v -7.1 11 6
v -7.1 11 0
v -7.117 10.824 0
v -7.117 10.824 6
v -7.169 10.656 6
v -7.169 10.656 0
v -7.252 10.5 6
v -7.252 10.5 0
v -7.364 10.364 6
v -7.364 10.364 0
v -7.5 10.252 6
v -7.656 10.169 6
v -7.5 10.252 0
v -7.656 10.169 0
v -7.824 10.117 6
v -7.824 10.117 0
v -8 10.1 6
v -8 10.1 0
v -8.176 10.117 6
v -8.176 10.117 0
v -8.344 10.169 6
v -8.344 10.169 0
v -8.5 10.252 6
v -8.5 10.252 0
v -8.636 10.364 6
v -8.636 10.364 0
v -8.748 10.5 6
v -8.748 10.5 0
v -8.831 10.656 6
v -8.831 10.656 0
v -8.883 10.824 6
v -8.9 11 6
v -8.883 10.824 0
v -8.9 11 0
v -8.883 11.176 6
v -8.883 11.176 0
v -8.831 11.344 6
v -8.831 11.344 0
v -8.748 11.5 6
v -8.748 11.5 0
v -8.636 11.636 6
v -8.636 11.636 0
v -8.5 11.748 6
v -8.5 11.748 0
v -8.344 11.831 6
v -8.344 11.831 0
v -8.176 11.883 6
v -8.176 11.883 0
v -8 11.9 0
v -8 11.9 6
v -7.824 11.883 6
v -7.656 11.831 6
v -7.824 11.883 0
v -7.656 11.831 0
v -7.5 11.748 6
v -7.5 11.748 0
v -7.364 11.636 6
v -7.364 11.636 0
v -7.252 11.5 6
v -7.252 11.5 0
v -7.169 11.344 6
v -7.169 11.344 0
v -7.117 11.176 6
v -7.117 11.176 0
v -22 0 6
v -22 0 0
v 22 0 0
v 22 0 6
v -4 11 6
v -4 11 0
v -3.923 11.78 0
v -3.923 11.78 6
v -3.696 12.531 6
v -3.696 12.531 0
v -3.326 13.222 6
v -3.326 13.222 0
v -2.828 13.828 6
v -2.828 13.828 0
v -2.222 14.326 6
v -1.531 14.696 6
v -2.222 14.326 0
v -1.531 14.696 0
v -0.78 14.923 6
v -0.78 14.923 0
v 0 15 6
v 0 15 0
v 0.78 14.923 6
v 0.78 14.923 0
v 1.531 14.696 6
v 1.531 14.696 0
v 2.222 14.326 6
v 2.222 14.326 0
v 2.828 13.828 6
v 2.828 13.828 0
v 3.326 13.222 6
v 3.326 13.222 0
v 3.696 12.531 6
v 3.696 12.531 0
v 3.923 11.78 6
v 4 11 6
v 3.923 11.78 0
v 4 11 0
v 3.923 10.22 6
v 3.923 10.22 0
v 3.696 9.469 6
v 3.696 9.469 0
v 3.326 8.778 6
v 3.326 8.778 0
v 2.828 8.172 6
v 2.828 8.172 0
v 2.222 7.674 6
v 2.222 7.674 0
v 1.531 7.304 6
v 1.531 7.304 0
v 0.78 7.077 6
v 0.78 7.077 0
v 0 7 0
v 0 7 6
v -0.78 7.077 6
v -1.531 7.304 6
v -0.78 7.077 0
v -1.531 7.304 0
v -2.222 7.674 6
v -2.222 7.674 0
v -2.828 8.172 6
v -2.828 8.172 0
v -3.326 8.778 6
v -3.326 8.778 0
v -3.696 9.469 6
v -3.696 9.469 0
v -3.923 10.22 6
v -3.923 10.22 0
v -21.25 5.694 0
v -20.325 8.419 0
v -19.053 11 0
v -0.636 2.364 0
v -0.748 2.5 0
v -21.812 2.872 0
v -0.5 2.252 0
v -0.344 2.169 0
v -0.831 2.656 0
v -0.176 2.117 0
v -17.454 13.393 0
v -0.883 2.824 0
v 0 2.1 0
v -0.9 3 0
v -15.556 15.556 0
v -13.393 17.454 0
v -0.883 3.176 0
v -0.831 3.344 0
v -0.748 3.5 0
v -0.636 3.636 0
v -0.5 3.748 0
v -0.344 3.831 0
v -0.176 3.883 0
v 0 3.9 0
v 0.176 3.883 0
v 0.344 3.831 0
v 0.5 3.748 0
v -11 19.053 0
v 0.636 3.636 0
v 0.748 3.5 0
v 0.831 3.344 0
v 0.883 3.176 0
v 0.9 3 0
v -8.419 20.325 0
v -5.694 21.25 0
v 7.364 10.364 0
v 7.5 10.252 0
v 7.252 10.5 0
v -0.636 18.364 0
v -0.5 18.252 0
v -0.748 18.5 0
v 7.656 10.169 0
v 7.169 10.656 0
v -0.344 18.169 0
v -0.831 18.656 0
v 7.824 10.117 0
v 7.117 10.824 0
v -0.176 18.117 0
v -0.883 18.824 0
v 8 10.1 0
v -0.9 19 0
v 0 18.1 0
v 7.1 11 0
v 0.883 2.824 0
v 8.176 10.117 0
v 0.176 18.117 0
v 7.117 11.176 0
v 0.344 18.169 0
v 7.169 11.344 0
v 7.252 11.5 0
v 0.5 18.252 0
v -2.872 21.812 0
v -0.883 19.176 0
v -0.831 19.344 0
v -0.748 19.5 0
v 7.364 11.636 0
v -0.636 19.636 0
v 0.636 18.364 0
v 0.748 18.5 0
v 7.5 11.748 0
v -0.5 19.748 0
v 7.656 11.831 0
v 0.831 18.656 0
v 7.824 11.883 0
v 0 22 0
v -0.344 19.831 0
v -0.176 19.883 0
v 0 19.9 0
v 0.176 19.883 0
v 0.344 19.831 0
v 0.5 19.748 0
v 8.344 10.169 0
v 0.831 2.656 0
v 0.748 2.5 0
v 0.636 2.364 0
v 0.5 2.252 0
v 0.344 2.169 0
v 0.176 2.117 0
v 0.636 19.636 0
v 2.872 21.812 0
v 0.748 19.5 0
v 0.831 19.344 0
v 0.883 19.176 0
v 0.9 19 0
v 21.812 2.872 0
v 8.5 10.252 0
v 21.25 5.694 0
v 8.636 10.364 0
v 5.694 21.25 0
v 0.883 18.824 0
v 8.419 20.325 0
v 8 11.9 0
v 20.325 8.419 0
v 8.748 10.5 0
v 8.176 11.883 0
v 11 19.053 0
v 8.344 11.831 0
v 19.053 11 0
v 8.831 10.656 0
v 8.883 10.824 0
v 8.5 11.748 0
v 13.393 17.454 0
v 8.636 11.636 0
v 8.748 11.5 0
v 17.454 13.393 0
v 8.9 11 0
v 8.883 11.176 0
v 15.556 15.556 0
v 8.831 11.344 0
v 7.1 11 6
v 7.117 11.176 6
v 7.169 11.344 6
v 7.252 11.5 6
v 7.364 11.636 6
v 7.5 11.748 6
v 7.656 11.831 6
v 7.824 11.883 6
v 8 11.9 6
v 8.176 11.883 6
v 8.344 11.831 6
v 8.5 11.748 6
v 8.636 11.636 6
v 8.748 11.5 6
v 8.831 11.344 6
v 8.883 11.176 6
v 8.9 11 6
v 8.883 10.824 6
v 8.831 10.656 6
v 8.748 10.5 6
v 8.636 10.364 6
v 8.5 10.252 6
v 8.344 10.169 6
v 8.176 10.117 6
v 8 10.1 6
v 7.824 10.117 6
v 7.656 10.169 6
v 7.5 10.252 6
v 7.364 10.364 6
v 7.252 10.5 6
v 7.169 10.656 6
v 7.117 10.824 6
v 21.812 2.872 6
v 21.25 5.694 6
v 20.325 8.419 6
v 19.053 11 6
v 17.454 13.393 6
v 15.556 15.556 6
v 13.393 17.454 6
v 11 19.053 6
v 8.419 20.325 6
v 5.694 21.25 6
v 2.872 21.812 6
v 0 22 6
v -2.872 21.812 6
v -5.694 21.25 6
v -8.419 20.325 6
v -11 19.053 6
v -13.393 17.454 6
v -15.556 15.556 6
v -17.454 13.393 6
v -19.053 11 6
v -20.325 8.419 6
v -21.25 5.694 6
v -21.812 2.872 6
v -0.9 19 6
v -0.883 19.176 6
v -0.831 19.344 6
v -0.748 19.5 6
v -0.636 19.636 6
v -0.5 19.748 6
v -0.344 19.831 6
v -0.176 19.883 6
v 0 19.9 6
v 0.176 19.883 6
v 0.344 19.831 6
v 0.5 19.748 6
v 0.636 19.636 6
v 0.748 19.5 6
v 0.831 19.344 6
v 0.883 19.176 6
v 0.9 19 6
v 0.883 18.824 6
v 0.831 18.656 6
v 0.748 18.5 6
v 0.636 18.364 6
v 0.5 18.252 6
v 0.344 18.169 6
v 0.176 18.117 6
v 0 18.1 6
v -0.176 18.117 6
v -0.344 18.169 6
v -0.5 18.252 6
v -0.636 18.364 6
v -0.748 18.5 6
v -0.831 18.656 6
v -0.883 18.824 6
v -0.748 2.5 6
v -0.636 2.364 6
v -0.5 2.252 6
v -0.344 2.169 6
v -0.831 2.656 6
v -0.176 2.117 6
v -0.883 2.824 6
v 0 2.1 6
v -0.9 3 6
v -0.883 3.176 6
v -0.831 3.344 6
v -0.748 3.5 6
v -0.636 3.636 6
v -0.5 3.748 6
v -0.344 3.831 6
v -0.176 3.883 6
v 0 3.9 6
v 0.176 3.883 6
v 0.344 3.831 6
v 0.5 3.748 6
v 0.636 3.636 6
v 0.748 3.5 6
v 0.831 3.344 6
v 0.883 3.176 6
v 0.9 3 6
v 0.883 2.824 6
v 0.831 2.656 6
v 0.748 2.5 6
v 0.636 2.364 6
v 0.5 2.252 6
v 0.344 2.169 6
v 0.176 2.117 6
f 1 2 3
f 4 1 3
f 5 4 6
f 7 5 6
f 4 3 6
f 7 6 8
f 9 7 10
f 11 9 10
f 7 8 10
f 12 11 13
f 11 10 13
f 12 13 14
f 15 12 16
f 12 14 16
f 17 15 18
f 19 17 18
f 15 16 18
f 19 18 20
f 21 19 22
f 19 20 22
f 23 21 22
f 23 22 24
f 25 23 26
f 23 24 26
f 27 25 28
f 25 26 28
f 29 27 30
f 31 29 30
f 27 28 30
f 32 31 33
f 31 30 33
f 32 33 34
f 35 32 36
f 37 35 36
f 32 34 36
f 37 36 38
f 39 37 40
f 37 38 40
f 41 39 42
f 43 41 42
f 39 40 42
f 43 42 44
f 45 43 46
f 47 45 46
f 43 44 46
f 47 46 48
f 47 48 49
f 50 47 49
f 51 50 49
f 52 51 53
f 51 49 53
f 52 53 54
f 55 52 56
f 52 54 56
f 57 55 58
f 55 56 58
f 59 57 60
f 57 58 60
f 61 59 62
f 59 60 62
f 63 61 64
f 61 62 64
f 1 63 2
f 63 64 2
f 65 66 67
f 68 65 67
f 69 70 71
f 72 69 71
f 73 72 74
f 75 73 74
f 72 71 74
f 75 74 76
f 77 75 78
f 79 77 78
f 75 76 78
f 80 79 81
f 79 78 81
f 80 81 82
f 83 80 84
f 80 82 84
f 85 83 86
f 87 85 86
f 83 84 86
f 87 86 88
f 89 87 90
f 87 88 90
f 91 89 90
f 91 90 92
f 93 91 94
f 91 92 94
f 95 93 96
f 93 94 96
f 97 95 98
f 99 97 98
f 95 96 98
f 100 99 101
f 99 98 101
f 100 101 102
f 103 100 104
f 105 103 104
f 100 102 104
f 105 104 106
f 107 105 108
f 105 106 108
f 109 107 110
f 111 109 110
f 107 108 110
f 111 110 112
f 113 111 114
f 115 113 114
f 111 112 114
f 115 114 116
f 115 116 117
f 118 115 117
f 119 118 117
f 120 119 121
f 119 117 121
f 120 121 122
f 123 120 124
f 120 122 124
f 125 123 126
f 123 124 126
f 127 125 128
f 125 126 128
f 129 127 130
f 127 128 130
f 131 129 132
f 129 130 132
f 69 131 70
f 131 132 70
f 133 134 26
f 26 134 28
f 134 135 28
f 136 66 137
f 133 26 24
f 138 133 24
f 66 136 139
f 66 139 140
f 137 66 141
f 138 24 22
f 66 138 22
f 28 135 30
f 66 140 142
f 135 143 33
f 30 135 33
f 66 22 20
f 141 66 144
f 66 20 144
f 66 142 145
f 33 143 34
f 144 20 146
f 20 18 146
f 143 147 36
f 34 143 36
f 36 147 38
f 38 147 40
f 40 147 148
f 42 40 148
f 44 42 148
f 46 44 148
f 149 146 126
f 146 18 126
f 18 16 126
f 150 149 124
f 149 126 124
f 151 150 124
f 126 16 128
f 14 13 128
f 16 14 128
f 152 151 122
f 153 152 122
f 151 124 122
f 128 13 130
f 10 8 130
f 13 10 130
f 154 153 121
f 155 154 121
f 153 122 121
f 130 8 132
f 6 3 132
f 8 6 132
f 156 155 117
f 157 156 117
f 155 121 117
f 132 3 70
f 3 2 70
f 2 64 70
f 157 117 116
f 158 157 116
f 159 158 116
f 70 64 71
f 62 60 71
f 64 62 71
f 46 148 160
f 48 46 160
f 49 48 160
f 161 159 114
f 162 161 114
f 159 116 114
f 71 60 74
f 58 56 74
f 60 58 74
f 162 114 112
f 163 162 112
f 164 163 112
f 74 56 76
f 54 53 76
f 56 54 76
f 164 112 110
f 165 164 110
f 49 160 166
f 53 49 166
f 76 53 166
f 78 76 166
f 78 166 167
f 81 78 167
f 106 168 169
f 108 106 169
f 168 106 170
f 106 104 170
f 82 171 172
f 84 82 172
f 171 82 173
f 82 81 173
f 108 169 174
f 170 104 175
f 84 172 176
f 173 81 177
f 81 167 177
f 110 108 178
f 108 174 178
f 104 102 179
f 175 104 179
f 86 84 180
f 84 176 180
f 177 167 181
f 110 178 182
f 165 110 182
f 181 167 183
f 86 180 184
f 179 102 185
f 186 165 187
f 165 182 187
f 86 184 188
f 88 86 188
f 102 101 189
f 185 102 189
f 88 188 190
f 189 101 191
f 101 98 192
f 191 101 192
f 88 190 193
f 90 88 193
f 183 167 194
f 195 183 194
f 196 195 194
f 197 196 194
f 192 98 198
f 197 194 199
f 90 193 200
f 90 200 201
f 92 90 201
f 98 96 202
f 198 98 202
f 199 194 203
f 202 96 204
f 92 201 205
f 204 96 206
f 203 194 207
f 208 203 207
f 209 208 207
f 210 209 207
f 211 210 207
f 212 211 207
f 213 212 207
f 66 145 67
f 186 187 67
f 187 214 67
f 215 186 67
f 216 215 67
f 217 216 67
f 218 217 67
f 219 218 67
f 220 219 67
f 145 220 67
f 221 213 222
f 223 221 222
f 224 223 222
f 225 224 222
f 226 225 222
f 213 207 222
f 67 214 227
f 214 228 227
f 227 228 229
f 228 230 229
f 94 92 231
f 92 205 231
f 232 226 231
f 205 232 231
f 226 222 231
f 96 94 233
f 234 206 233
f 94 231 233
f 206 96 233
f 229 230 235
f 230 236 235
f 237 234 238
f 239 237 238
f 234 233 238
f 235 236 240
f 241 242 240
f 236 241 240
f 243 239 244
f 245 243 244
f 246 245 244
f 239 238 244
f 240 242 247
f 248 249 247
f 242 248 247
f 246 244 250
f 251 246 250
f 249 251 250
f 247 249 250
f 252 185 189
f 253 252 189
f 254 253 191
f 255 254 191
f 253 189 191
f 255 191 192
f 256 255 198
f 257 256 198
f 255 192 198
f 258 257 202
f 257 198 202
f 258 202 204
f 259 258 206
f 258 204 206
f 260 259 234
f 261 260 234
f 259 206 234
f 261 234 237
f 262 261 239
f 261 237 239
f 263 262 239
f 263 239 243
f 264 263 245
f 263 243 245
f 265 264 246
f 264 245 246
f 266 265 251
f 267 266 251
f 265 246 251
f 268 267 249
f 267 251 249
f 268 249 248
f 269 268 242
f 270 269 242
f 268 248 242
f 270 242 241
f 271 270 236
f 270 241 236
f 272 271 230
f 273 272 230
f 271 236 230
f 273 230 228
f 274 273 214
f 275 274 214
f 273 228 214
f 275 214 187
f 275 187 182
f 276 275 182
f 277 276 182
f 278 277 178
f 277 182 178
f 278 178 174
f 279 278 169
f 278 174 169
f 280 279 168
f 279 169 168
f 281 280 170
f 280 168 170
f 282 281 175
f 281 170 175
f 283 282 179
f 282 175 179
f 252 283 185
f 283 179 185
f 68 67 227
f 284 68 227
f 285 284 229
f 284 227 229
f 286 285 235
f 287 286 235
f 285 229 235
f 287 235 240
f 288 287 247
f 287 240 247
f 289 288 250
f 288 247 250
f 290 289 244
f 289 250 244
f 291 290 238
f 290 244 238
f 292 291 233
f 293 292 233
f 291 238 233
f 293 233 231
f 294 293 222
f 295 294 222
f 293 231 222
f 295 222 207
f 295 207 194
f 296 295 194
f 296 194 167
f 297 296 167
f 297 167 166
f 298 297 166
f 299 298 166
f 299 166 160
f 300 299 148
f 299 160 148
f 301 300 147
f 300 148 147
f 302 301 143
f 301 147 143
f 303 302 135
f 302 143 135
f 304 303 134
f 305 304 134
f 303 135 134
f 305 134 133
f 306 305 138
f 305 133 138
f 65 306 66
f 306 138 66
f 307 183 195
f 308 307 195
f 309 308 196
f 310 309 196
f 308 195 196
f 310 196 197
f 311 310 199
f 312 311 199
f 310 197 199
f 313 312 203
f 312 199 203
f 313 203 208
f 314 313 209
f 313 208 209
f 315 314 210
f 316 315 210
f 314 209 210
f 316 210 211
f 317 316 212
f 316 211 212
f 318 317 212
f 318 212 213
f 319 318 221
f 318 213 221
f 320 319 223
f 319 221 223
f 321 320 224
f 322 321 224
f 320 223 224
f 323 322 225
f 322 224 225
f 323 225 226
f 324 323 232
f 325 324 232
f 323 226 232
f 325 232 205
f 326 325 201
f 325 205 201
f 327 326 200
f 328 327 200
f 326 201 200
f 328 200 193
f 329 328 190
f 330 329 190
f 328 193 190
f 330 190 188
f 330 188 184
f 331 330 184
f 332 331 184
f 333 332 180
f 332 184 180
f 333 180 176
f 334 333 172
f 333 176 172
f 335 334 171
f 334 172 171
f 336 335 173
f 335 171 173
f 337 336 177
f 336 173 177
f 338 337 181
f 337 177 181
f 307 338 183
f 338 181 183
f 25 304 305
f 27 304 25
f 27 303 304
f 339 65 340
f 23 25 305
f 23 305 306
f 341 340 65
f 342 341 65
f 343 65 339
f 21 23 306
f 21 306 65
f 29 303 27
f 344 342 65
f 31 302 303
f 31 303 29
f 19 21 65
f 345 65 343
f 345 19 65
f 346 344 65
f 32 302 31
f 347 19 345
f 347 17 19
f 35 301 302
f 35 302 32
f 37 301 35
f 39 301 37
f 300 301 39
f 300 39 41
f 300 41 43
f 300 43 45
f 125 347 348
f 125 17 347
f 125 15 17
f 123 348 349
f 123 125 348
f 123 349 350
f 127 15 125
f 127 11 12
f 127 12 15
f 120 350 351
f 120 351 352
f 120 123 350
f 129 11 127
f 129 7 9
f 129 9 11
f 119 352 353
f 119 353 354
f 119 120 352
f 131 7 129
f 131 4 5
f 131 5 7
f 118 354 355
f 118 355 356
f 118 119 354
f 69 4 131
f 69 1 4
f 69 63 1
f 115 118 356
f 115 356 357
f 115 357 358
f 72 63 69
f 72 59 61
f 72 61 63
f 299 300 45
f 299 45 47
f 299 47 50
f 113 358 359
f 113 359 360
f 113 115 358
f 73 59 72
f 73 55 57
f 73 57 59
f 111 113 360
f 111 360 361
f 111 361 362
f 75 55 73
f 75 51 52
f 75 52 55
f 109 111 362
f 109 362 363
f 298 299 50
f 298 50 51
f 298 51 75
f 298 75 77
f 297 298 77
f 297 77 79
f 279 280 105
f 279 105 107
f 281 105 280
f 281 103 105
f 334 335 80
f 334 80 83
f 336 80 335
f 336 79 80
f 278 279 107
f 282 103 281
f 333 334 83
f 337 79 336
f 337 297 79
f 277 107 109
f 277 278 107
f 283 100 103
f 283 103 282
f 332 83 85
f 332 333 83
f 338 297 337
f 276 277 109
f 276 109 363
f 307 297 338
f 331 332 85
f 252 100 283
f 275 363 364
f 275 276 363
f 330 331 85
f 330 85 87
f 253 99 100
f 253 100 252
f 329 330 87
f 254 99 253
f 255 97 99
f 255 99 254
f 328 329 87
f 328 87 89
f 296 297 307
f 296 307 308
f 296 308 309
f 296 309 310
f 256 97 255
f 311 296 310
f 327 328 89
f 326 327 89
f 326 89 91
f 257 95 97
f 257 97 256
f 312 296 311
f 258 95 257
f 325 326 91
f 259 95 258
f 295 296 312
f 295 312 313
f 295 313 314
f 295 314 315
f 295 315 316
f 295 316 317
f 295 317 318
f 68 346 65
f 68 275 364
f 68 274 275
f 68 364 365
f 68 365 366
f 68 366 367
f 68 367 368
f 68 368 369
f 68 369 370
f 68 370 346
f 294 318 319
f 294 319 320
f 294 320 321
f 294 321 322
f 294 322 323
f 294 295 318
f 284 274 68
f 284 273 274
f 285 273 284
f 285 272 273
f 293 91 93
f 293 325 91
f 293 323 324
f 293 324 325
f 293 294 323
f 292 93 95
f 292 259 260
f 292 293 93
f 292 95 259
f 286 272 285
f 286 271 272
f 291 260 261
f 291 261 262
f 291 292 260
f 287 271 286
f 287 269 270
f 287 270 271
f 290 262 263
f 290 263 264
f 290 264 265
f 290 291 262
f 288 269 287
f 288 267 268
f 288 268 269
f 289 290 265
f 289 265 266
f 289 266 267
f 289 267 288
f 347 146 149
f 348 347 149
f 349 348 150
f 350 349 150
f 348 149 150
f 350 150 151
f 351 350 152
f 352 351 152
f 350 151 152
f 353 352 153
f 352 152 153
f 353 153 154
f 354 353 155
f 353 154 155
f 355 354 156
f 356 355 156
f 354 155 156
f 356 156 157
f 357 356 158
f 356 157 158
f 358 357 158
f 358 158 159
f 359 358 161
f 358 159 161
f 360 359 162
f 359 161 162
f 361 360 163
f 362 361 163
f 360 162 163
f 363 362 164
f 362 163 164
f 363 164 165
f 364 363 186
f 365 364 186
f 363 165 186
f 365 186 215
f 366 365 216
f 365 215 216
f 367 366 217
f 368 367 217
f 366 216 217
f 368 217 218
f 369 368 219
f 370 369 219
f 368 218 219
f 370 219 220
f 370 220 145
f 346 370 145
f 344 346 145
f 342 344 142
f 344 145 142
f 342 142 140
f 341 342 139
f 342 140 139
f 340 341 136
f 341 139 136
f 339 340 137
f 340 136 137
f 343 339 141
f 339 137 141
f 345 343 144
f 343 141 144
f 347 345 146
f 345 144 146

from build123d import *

# Parameters (mm, degrees)
BOSS_EXTRU_2_DEPTH      = 6
ESQUISSE4_R             = 4
ESQUISSE4_R_2           = 0.9
ENL_V_MAT_EXTRU_1_DEPTH = 6


with BuildPart() as part:
    # Esquisse2 → Boss.-Extru.2 (new body)
    with BuildSketch(Plane.XY):
        with BuildLine():
            Line((-22, 0), (22, 0))
            ThreePointArc((22, 0), (0, 22), (-22, 0))
        make_face()
    extrude(amount=BOSS_EXTRU_2_DEPTH)

    # Esquisse4 → Enlèv. mat.-Extru.1 (cut)
    with BuildSketch(Plane(origin=(0, 0, 0), x_dir=(-1, 0, 0), z_dir=(0, 0, -1))):
        with Locations((0, 11)):
            Circle(ESQUISSE4_R)
        with Locations((0, 19)):
            Circle(ESQUISSE4_R_2)
        with Locations((0, 3)):
            Circle(ESQUISSE4_R_2)
        with Locations((-8, 11)):
            Circle(ESQUISSE4_R_2)
        with Locations(Location((8, 11, 0), (0, 0, 180))):
            Circle(ESQUISSE4_R_2)
    extrude(amount=-ENL_V_MAT_EXTRU_1_DEPTH, mode=Mode.SUBTRACT)


solid = part.part
